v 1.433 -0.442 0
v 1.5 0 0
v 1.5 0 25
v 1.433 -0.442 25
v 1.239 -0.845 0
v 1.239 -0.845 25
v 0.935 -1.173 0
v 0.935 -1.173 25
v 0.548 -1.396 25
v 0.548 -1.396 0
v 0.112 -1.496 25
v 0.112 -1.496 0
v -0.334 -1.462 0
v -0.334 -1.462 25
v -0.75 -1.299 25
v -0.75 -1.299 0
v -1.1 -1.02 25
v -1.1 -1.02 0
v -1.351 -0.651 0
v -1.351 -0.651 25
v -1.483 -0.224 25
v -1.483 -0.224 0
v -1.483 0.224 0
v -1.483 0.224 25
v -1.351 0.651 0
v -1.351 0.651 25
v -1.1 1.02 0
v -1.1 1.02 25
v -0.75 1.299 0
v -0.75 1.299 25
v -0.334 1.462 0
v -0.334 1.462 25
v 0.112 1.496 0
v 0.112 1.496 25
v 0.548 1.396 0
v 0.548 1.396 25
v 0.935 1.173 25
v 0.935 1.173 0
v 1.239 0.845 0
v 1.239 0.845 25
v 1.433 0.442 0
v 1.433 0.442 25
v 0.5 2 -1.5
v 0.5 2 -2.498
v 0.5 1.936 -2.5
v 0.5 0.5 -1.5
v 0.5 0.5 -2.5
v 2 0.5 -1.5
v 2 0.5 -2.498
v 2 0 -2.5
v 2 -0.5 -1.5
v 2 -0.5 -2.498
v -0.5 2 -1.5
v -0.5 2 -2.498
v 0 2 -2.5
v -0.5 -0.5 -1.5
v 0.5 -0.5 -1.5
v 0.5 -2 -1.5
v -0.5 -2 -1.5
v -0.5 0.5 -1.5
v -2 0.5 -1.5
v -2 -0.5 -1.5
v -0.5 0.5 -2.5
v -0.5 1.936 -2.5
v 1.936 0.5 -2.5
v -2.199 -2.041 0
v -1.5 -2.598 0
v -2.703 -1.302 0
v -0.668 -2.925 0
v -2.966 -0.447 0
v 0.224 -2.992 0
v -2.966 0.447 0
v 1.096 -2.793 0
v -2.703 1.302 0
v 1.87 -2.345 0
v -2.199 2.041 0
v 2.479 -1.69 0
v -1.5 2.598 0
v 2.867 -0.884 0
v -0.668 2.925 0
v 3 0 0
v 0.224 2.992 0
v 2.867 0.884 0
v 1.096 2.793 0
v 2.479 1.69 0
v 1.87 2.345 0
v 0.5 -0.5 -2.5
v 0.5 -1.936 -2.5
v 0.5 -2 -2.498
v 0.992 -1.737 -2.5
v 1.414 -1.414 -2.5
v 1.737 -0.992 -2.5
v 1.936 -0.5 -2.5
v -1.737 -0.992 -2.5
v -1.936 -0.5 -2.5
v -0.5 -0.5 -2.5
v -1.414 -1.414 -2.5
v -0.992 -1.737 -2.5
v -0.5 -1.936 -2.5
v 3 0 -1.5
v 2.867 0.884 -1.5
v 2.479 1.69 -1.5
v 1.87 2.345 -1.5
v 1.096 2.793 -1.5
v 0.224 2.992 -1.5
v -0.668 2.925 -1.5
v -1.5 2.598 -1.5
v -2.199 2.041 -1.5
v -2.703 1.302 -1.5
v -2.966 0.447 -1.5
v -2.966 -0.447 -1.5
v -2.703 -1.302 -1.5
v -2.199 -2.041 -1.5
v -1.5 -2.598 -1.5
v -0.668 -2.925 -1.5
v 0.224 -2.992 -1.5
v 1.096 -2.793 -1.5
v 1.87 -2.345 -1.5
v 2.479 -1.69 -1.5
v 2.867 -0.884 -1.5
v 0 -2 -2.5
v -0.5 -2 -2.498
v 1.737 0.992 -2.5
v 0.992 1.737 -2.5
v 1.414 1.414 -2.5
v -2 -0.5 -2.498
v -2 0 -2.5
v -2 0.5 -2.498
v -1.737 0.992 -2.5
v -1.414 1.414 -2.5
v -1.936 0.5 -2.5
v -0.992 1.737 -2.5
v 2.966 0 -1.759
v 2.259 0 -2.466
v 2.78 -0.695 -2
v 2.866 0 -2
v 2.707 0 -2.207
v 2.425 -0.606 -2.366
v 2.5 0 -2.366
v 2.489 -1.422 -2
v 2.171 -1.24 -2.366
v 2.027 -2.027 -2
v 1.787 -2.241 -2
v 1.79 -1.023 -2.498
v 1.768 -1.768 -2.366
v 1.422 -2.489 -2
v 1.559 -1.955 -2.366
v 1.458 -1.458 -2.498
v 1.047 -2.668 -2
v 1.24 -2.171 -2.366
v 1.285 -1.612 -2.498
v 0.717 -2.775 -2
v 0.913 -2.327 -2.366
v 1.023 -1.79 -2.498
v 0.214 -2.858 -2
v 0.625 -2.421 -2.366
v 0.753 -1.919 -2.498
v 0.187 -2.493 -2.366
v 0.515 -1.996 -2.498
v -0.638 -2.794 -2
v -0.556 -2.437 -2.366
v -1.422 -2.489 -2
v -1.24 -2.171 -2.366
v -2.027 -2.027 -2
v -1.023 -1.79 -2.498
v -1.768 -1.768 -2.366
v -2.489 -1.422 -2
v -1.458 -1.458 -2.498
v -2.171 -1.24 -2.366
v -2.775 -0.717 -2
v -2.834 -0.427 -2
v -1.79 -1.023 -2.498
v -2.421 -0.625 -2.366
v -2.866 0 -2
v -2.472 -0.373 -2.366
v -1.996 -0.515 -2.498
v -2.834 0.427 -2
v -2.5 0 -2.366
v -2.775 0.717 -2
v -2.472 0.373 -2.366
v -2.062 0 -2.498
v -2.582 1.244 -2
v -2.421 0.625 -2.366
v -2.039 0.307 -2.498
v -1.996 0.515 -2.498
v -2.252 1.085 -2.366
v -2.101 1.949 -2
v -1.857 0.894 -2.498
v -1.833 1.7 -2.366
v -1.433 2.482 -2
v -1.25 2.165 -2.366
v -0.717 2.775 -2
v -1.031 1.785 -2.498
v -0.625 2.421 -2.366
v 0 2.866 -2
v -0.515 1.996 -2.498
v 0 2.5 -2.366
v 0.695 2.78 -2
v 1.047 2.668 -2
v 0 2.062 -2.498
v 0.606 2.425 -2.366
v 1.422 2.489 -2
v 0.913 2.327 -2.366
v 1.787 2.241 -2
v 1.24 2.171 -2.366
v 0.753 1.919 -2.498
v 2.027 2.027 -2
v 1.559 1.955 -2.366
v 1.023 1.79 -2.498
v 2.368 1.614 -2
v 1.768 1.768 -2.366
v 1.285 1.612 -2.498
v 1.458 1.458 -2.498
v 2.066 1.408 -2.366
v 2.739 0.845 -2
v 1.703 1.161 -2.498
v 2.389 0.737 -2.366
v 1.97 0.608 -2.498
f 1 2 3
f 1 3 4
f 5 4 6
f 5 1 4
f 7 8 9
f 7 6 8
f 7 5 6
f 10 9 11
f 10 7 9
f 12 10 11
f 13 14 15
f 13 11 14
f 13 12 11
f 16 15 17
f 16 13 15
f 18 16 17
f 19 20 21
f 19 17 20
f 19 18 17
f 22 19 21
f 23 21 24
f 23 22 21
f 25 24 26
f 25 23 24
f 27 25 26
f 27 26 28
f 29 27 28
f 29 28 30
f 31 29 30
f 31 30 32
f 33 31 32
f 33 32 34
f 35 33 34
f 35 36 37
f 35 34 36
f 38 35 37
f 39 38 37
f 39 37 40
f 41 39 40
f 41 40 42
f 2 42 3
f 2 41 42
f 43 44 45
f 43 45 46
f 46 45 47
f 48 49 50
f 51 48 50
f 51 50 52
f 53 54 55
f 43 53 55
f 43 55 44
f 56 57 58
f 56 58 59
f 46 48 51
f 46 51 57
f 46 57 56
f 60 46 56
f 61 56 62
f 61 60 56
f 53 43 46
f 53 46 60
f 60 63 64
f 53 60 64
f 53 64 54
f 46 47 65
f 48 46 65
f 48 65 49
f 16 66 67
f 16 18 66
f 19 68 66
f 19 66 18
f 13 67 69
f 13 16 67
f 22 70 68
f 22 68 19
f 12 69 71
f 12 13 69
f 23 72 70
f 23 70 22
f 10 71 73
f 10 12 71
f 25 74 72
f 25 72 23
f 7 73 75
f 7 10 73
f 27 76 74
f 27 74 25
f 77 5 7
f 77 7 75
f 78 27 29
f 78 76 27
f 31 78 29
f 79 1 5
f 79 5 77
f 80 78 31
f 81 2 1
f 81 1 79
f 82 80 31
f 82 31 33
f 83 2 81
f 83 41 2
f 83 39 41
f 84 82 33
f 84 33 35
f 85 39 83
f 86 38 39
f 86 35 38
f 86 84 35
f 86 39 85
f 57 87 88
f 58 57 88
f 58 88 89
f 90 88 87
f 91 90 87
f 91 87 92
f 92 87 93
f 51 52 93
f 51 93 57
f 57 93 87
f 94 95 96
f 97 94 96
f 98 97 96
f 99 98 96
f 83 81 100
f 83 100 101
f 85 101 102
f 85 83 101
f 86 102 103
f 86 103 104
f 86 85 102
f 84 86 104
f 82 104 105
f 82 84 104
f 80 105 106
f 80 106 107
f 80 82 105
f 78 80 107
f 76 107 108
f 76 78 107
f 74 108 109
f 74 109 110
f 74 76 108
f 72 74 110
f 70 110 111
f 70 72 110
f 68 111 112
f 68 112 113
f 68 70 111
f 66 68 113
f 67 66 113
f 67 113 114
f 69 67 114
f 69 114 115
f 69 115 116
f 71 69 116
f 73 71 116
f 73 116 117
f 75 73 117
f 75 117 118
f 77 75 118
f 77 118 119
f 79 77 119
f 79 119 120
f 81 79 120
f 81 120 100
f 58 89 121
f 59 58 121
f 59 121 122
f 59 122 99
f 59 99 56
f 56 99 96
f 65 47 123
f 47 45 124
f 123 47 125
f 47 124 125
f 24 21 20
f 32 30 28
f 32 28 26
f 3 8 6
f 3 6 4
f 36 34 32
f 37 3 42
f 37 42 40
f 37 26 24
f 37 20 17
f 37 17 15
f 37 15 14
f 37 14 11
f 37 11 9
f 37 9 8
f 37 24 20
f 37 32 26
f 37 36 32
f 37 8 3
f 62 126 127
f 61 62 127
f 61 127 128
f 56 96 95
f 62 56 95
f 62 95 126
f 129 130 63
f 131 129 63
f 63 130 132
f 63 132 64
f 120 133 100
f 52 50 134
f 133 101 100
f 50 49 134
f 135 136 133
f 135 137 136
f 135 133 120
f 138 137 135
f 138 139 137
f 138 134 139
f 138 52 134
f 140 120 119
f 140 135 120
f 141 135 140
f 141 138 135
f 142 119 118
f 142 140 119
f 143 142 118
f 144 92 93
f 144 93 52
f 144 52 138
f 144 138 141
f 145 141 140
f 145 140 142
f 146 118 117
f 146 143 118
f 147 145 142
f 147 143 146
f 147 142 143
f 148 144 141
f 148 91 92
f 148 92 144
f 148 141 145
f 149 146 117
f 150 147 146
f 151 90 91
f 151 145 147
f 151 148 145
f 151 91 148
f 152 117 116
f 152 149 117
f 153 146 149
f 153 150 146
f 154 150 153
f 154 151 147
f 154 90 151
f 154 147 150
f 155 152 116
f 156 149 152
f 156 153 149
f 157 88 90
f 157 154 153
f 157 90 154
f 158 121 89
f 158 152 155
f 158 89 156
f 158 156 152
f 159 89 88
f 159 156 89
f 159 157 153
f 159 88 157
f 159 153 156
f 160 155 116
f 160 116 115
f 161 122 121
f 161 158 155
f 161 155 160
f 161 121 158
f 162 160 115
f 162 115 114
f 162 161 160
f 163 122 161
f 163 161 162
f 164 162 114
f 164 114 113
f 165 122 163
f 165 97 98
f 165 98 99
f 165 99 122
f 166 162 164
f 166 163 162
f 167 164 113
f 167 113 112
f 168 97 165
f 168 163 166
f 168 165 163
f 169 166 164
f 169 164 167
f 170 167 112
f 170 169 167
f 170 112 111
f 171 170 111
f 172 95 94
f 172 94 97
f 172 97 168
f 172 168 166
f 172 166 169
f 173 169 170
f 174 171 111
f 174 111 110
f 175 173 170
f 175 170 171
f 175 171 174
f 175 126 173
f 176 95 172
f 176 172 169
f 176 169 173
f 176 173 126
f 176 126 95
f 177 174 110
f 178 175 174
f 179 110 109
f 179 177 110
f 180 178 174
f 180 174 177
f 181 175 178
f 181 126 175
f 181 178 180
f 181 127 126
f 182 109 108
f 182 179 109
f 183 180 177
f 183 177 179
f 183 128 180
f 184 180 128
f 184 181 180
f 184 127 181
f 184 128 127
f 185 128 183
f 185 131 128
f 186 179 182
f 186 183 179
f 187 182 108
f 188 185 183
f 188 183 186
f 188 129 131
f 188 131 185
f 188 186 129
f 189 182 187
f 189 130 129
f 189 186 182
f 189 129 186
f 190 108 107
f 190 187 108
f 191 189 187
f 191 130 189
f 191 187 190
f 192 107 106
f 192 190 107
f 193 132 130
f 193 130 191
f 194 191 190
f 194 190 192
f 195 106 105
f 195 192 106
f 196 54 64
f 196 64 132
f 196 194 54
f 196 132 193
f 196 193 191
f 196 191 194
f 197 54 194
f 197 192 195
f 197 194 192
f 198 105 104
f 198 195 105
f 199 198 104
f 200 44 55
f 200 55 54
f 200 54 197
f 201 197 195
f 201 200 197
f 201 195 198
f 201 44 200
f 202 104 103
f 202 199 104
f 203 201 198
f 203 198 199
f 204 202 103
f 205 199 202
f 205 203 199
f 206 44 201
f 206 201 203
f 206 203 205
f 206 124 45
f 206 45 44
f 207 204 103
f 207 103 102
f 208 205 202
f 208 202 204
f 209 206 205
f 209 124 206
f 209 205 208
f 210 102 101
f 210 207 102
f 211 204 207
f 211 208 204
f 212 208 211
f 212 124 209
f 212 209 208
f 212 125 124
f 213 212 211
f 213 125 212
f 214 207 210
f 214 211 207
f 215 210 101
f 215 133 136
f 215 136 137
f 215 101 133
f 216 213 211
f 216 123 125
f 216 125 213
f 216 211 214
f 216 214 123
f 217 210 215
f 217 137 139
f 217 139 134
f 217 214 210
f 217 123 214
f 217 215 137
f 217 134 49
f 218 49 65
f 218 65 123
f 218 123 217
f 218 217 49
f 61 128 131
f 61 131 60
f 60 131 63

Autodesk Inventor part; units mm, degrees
ref_plane "YZ Plane" through (0, 0, 0) normal (1, 0, 0) x (0, 1, 0)
ref_plane "XZ Plane" through (0, 0, 0) normal (0, 1, 0) x (-1, 0, 0)
ref_plane "XY Plane" through (0, 0, 0) normal (0, 0, 1) x (1, 0, 0)
sketch "Sketch1" plane through (0, 0, 0) normal (0, 0, 1) x (1, 0, 0)
  circle A0 centre (0, 0) radius 1.5
  circle A1 centre (0, 0) radius 3
  dimension "d0" = 3
  dimension "d1" = 6
extrude "Extrusion1" add sketch "Sketch1" along normal blind 25 contours A0
sketch "Sketch2" plane through (0, 0, 0) normal (0, 0, -1) x (-1, 0, 0)
  point P0 (0, 0)
extrude "Extrusion2" add sketch "Sketch1" against normal blind 2.5 contours A0 | A1
thread "Thread1" size "M3x0.5" class "6g" standard "ISO Metric profile" full length
sketch "Sketch3" plane through (0, 0, -2.5) normal (0, 0, -1) x (-1, 0, 0)
  point P0 (0, 0)
sketch "Sketch4" plane through (0, 0, -2.5) normal (0, 0, -1) x (-1, 0, 0)
  line L0 (-0.5, -2) -> (0.5, -2)
  line L1 (0.5, -2) -> (0.5, 2)
  line L2 (0.5, 2) -> (-0.5, 2)
  line L3 (-0.5, 2) -> (-0.5, -2)
  circle A0 centre (0, 0) radius 1.5 projected
  line L4 (-0.5, -2) -> (0.5, 2) construction
  line L5 (0.5, -2) -> (-0.5, 2) construction
  line L6 (-2, -0.5) -> (2, -0.5)
  line L7 (2, -0.5) -> (2, 0.5)
  line L8 (2, 0.5) -> (-2, 0.5)
  line L9 (-2, 0.5) -> (-2, -0.5)
  circle A1 centre (0, 0) radius 3 projected
  line L10 (-2, -0.5) -> (2, 0.5) construction
  line L11 (2, -0.5) -> (-2, 0.5) construction
  point P0 (-0.5, 0.5)
  point P1 (-0.5, -0.5)
  point P2 (0.5, -0.5)
  point P3 (0.5, 0.5)
  dimension "d8" = 1
  dimension "d9" = 4
  dimension "d10" = 4
  dimension "d11" = 1
extrude "Extrusion3" cut sketch "Sketch4" against normal blind 1 contours L3 A0 L1 L0 | L3 L6 L1 A0 | L6 A0 L8 L3 | L3 L8 L1 L6 | L6 L9 L8 A0 | L1 L8 A0 L6 | A0 L8 L7 L6 | L3 A0 L1 L8 | L3 L2 L1 A0
fillet "Fillet1" radius 1 1 edges at (-3, 0, -2.5)
properties part number "16x2.5 Bolt"
